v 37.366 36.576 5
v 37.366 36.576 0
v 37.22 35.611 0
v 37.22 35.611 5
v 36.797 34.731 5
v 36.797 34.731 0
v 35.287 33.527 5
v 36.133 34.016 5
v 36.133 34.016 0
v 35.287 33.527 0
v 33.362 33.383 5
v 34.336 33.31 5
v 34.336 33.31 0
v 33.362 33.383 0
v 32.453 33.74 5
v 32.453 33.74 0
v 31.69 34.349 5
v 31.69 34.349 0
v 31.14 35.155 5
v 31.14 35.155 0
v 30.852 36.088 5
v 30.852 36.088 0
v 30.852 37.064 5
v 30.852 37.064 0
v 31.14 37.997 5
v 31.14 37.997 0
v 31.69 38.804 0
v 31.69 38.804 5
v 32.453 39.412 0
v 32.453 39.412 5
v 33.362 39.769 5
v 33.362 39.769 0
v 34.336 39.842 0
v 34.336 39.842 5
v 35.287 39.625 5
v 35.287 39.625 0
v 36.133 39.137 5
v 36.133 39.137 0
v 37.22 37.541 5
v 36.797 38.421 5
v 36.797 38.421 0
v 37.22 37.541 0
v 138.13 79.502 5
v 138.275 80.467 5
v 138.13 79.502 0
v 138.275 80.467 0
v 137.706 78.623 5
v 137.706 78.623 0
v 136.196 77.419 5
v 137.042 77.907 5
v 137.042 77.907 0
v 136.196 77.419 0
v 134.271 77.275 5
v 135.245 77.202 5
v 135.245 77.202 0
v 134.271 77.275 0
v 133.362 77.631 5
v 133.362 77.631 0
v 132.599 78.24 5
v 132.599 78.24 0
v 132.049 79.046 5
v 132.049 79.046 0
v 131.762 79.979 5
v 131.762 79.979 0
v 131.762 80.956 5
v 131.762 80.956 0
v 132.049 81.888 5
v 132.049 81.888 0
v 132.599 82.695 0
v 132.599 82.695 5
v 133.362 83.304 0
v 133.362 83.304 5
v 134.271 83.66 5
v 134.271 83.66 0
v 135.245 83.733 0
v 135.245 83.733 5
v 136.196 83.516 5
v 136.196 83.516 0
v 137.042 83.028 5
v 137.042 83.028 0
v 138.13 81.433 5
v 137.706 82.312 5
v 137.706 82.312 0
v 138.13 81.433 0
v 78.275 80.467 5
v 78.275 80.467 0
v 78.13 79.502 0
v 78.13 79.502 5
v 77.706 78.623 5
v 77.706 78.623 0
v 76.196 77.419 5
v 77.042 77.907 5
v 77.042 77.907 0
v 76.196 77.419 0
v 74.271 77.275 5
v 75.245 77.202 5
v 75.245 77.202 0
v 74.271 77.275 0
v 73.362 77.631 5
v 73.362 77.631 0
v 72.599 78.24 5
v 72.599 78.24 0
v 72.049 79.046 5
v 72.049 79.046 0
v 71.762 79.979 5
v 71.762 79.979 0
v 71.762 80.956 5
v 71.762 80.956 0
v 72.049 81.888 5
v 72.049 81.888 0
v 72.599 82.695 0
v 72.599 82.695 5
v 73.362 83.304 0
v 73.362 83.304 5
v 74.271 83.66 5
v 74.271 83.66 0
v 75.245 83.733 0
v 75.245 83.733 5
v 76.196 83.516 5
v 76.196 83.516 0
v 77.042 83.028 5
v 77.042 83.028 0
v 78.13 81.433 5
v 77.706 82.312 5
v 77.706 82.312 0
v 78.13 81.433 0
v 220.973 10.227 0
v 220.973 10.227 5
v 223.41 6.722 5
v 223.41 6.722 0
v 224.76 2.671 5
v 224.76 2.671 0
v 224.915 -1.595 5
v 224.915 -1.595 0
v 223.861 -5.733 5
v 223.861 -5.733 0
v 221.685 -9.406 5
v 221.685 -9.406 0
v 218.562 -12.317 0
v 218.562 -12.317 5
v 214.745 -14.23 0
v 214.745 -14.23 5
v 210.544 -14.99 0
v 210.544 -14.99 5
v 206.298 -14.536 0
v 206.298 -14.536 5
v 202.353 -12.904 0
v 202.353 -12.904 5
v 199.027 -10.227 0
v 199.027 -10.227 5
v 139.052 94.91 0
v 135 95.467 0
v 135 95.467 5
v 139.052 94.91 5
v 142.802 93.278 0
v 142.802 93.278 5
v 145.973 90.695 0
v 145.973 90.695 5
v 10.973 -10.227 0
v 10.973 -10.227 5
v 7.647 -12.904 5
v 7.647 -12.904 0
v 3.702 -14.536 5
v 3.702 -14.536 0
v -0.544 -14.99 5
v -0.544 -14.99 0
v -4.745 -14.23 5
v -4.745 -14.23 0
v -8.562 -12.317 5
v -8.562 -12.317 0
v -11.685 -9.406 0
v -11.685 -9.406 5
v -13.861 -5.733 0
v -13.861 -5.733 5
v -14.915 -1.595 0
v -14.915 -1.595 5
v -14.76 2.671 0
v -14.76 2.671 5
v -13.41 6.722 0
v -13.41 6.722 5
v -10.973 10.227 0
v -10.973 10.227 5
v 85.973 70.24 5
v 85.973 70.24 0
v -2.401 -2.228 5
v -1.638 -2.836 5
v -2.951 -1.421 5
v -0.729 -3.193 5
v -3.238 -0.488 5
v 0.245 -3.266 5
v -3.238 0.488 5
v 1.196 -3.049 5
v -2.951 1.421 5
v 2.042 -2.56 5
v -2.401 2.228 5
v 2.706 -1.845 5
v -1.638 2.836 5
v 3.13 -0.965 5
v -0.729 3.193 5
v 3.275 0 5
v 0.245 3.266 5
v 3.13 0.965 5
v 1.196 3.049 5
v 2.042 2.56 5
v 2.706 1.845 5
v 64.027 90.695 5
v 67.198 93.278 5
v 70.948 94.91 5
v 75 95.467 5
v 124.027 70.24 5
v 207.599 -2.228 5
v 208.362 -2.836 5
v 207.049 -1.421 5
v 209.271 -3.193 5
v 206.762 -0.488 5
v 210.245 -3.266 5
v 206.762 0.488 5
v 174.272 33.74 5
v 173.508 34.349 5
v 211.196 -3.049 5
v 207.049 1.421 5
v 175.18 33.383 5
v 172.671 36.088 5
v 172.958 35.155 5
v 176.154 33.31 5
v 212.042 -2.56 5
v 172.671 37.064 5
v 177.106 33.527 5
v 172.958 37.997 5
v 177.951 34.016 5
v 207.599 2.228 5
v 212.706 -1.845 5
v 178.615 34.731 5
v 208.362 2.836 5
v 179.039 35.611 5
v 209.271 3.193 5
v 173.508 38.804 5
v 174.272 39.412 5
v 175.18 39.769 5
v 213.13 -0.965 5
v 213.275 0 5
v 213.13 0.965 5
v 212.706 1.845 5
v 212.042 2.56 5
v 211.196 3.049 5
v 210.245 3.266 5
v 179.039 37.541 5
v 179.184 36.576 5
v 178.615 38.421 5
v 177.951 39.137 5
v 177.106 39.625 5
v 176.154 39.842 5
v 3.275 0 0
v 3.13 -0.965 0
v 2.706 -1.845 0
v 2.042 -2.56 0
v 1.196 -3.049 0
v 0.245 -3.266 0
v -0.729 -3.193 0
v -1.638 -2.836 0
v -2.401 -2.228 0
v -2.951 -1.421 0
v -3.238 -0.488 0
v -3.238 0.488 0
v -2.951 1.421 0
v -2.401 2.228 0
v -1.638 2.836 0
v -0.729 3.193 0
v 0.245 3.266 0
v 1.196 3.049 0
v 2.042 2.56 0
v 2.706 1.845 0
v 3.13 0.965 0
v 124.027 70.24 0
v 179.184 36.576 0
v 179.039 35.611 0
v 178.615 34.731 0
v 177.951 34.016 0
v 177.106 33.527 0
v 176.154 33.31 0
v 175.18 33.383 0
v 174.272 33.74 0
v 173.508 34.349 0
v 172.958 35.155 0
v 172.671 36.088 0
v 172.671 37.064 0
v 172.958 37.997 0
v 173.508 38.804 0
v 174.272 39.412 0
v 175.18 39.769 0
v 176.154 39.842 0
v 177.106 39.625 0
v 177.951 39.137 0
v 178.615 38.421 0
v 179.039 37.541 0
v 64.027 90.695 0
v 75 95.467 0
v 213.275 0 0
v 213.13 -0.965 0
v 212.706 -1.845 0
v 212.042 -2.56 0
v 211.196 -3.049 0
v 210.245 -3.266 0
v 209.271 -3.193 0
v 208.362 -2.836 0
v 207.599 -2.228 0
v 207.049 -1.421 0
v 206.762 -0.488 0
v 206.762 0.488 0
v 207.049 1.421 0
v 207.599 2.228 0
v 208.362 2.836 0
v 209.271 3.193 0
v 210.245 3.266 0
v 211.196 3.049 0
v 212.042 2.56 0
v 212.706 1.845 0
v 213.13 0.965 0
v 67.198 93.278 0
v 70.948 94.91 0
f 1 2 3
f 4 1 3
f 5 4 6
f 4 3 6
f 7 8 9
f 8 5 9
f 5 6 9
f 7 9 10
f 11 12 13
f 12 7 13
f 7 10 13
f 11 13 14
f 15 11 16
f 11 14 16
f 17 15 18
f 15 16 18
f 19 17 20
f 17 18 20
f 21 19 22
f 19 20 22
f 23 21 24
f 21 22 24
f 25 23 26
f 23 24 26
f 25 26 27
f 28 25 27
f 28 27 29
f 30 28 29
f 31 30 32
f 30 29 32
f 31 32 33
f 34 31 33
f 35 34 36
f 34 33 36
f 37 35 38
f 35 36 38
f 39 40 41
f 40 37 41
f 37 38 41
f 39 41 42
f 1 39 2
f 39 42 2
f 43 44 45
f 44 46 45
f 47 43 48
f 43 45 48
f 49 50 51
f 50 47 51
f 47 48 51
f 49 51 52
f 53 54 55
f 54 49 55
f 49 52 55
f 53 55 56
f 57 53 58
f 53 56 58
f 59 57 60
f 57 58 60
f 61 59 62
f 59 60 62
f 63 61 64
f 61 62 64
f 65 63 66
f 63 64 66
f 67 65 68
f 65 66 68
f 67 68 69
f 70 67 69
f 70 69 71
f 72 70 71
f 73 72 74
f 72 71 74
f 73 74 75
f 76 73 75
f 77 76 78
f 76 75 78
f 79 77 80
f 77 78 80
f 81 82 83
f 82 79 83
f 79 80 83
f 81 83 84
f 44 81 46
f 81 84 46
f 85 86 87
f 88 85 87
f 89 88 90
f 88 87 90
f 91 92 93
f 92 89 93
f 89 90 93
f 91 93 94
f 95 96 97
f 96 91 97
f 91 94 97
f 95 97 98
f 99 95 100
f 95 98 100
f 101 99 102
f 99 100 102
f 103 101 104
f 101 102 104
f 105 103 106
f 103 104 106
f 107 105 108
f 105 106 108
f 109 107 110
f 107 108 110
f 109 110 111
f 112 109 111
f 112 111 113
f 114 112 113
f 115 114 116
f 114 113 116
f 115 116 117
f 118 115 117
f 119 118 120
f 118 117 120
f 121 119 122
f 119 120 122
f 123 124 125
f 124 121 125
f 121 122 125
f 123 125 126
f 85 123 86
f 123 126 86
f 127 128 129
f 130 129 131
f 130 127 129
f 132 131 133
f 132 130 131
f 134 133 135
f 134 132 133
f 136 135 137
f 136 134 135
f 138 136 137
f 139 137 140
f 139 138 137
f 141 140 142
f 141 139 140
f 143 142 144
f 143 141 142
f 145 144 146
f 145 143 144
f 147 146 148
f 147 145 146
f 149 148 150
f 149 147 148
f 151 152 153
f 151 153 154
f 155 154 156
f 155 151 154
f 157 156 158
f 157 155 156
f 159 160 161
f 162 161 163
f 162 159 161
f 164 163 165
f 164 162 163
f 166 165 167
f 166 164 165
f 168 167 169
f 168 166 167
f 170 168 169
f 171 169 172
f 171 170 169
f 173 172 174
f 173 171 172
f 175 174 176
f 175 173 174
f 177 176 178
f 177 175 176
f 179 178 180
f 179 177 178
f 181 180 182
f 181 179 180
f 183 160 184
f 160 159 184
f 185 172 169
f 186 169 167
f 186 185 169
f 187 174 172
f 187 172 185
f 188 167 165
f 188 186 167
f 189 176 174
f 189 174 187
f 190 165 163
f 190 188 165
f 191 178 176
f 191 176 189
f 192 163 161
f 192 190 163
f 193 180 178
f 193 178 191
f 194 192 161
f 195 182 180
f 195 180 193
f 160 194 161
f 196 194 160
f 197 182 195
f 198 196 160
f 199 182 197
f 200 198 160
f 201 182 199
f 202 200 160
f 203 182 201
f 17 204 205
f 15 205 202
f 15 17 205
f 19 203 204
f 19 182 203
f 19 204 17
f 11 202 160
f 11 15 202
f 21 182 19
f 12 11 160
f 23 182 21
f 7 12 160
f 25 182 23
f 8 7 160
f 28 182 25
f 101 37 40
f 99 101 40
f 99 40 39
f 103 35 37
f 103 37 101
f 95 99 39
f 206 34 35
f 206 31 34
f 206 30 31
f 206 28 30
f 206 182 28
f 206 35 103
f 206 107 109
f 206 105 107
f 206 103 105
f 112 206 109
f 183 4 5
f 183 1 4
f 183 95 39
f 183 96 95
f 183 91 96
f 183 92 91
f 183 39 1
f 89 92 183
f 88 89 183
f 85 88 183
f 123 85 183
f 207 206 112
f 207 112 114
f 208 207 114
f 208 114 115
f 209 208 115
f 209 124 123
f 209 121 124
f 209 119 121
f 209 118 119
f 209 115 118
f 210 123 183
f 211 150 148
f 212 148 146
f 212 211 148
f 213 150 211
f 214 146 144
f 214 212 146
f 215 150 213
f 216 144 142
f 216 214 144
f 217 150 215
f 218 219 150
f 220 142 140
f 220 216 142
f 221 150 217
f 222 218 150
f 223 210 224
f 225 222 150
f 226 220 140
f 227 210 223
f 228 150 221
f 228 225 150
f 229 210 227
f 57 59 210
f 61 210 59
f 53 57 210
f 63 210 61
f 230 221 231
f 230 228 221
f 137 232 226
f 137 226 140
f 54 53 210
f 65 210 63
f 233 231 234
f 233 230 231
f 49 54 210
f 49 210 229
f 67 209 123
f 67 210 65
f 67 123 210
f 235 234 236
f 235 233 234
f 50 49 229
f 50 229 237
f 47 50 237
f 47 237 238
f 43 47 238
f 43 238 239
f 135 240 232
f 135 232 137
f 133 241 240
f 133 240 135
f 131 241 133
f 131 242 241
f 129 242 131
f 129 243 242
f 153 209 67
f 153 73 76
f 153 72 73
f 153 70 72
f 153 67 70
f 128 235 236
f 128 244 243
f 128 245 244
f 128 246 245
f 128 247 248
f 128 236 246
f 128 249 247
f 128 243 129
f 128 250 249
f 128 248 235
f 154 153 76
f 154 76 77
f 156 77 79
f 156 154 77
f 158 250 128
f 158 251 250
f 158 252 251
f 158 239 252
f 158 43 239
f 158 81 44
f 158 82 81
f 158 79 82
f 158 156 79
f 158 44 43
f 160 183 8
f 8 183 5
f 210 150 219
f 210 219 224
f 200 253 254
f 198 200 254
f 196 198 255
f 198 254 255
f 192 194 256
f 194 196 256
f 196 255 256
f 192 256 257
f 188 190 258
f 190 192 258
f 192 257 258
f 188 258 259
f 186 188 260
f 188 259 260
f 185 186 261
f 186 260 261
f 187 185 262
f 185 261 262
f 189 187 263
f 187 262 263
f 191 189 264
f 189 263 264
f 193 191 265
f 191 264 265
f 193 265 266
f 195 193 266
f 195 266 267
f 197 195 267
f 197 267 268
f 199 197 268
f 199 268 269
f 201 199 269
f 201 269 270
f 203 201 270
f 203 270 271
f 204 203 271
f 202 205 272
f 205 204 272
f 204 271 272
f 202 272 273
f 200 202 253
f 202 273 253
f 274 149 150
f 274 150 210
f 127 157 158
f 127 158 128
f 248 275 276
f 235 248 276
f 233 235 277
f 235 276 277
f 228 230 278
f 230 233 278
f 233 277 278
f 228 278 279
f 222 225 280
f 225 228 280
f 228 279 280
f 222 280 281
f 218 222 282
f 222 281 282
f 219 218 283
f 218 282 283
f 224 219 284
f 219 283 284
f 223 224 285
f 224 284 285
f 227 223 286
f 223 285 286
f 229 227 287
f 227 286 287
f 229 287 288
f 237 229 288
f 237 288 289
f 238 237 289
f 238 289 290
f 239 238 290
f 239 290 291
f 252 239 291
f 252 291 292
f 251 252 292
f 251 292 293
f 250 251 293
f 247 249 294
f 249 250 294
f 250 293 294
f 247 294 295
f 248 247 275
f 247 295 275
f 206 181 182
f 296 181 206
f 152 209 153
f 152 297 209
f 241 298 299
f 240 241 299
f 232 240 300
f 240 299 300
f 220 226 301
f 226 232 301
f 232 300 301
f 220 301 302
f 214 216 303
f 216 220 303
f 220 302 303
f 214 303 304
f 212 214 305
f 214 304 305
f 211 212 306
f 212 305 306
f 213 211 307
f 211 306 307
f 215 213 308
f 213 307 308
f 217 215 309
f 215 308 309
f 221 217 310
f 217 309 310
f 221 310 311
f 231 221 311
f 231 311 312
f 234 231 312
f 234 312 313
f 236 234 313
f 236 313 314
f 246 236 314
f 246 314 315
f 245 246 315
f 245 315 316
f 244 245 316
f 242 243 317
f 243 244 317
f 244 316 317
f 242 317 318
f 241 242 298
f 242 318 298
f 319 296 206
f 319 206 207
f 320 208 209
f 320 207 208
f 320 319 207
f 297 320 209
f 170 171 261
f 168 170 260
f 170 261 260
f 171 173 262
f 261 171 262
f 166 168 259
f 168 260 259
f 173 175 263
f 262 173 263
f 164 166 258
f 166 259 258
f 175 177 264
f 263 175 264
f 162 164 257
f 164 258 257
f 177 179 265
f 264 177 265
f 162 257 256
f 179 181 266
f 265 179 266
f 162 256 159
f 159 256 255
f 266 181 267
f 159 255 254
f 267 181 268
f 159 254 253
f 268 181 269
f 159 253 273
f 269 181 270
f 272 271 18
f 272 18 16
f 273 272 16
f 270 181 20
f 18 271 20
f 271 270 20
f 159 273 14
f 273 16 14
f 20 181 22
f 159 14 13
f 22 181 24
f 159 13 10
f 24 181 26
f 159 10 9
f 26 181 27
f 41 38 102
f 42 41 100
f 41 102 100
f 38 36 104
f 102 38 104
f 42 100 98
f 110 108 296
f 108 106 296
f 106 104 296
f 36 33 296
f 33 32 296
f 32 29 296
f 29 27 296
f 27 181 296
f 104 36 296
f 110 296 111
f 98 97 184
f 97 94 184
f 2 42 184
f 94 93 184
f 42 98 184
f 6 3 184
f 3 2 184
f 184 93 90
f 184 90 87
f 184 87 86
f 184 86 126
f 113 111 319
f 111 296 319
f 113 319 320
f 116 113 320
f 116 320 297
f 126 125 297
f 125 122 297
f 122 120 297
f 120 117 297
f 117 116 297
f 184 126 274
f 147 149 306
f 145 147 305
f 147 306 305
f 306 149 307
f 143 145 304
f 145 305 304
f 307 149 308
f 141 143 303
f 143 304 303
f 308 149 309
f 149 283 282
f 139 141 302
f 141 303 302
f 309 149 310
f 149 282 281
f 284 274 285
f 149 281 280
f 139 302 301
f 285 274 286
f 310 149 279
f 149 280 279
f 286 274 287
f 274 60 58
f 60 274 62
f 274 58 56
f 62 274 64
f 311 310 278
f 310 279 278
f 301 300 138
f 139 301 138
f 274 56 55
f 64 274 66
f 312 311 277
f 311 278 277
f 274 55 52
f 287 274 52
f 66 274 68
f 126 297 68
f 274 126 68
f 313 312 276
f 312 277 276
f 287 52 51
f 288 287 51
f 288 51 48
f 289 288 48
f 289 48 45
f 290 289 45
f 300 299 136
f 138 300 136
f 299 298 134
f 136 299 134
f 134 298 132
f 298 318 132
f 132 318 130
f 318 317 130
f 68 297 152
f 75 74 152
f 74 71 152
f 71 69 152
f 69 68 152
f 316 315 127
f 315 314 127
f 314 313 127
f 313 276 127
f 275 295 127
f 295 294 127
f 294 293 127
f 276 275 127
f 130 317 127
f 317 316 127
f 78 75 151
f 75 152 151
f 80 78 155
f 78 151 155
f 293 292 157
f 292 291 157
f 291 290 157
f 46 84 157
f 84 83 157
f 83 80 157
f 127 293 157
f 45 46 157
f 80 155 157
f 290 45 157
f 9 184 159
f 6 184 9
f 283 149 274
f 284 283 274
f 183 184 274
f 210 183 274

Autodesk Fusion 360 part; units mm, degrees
sketch "Sketch1" plane through (0, 0, 0) normal (0, 0, 1) x (1, 0, 0)
  circle A0 centre (0, 0) radius 3.275
  circle A1 centre (210, 0) radius 3.275
  circle A2 centre (0, 0) radius 15
  circle A3 centre (210, 0) radius 15
  line L0 (0, 15) -> (210, 15)
  line L1 (0, -15) -> (210, -15)
  circle A4 centre (0, 0) radius 20 construction
  circle A5 centre (210, 0) radius 20 construction
  circle A6 centre (75, 80.4674) radius 3.275
  circle A7 centre (135, 80.4674) radius 3.275
  circle A8 centre (75, 80.4674) radius 15
  circle A9 centre (135, 80.4674) radius 15
  line L2 (-10.9728, 10.2273) -> (64.0272, 90.6947)
  line L3 (75, 95.4674) -> (135, 95.4674)
  line L4 (145.9728, 90.6947) -> (220.9728, 10.2273)
  circle A10 centre (34.0909, 36.5761) radius 30 construction
  circle A11 centre (75, 80.4674) radius 30 construction
  circle A12 centre (175.9091, 36.5761) radius 30 construction
  circle A13 centre (135, 80.4674) radius 30 construction
  line L5 (0, 0) -> (75, 80.4674) construction
  circle A14 centre (34.0909, 36.5761) radius 3.275
  circle A15 centre (175.9091, 36.5761) radius 3.275
  line L6 (10.9728, -10.2273) -> (85.9728, 70.2401)
  line L7 (199.0272, -10.2273) -> (124.0272, 70.2401)
  line L8 (85.9728, 70.2401) -> (124.0272, 70.2401)
  dimension "d2" = 6.55
  dimension "d3" = 6.55
  dimension "d4" = 210
  dimension "d6" = 30
  dimension "d7" = 30
  dimension "d10" = 40
  dimension "d11" = 40
  dimension "d14" = 6.55
  dimension "d15" = 6.55
  dimension "d16" = 30
  dimension "d17" = 30
  dimension "d20" = 60
  dimension "d21" = 60
  dimension "d22" = 60
  dimension "d23" = 60
  dimension "d24" = 6.55
  dimension "d25" = 6.55
extrude "Extrude1" add sketch "Sketch1" along normal blind 5 contours A2 | A2 L0 L6 | A2 L0 A8 L2 L6 | A8 | A3 L0 A9 L4 L7 | A3 L0 L7 | A8 A9 L3 L8 | A3 | A9
equation "SlipGearNominal = 209.5 mm"
equation "d4 = SlipGearNominal + SlipGearOffset"
equation "SlipGearOffset = 0.5 mm"
